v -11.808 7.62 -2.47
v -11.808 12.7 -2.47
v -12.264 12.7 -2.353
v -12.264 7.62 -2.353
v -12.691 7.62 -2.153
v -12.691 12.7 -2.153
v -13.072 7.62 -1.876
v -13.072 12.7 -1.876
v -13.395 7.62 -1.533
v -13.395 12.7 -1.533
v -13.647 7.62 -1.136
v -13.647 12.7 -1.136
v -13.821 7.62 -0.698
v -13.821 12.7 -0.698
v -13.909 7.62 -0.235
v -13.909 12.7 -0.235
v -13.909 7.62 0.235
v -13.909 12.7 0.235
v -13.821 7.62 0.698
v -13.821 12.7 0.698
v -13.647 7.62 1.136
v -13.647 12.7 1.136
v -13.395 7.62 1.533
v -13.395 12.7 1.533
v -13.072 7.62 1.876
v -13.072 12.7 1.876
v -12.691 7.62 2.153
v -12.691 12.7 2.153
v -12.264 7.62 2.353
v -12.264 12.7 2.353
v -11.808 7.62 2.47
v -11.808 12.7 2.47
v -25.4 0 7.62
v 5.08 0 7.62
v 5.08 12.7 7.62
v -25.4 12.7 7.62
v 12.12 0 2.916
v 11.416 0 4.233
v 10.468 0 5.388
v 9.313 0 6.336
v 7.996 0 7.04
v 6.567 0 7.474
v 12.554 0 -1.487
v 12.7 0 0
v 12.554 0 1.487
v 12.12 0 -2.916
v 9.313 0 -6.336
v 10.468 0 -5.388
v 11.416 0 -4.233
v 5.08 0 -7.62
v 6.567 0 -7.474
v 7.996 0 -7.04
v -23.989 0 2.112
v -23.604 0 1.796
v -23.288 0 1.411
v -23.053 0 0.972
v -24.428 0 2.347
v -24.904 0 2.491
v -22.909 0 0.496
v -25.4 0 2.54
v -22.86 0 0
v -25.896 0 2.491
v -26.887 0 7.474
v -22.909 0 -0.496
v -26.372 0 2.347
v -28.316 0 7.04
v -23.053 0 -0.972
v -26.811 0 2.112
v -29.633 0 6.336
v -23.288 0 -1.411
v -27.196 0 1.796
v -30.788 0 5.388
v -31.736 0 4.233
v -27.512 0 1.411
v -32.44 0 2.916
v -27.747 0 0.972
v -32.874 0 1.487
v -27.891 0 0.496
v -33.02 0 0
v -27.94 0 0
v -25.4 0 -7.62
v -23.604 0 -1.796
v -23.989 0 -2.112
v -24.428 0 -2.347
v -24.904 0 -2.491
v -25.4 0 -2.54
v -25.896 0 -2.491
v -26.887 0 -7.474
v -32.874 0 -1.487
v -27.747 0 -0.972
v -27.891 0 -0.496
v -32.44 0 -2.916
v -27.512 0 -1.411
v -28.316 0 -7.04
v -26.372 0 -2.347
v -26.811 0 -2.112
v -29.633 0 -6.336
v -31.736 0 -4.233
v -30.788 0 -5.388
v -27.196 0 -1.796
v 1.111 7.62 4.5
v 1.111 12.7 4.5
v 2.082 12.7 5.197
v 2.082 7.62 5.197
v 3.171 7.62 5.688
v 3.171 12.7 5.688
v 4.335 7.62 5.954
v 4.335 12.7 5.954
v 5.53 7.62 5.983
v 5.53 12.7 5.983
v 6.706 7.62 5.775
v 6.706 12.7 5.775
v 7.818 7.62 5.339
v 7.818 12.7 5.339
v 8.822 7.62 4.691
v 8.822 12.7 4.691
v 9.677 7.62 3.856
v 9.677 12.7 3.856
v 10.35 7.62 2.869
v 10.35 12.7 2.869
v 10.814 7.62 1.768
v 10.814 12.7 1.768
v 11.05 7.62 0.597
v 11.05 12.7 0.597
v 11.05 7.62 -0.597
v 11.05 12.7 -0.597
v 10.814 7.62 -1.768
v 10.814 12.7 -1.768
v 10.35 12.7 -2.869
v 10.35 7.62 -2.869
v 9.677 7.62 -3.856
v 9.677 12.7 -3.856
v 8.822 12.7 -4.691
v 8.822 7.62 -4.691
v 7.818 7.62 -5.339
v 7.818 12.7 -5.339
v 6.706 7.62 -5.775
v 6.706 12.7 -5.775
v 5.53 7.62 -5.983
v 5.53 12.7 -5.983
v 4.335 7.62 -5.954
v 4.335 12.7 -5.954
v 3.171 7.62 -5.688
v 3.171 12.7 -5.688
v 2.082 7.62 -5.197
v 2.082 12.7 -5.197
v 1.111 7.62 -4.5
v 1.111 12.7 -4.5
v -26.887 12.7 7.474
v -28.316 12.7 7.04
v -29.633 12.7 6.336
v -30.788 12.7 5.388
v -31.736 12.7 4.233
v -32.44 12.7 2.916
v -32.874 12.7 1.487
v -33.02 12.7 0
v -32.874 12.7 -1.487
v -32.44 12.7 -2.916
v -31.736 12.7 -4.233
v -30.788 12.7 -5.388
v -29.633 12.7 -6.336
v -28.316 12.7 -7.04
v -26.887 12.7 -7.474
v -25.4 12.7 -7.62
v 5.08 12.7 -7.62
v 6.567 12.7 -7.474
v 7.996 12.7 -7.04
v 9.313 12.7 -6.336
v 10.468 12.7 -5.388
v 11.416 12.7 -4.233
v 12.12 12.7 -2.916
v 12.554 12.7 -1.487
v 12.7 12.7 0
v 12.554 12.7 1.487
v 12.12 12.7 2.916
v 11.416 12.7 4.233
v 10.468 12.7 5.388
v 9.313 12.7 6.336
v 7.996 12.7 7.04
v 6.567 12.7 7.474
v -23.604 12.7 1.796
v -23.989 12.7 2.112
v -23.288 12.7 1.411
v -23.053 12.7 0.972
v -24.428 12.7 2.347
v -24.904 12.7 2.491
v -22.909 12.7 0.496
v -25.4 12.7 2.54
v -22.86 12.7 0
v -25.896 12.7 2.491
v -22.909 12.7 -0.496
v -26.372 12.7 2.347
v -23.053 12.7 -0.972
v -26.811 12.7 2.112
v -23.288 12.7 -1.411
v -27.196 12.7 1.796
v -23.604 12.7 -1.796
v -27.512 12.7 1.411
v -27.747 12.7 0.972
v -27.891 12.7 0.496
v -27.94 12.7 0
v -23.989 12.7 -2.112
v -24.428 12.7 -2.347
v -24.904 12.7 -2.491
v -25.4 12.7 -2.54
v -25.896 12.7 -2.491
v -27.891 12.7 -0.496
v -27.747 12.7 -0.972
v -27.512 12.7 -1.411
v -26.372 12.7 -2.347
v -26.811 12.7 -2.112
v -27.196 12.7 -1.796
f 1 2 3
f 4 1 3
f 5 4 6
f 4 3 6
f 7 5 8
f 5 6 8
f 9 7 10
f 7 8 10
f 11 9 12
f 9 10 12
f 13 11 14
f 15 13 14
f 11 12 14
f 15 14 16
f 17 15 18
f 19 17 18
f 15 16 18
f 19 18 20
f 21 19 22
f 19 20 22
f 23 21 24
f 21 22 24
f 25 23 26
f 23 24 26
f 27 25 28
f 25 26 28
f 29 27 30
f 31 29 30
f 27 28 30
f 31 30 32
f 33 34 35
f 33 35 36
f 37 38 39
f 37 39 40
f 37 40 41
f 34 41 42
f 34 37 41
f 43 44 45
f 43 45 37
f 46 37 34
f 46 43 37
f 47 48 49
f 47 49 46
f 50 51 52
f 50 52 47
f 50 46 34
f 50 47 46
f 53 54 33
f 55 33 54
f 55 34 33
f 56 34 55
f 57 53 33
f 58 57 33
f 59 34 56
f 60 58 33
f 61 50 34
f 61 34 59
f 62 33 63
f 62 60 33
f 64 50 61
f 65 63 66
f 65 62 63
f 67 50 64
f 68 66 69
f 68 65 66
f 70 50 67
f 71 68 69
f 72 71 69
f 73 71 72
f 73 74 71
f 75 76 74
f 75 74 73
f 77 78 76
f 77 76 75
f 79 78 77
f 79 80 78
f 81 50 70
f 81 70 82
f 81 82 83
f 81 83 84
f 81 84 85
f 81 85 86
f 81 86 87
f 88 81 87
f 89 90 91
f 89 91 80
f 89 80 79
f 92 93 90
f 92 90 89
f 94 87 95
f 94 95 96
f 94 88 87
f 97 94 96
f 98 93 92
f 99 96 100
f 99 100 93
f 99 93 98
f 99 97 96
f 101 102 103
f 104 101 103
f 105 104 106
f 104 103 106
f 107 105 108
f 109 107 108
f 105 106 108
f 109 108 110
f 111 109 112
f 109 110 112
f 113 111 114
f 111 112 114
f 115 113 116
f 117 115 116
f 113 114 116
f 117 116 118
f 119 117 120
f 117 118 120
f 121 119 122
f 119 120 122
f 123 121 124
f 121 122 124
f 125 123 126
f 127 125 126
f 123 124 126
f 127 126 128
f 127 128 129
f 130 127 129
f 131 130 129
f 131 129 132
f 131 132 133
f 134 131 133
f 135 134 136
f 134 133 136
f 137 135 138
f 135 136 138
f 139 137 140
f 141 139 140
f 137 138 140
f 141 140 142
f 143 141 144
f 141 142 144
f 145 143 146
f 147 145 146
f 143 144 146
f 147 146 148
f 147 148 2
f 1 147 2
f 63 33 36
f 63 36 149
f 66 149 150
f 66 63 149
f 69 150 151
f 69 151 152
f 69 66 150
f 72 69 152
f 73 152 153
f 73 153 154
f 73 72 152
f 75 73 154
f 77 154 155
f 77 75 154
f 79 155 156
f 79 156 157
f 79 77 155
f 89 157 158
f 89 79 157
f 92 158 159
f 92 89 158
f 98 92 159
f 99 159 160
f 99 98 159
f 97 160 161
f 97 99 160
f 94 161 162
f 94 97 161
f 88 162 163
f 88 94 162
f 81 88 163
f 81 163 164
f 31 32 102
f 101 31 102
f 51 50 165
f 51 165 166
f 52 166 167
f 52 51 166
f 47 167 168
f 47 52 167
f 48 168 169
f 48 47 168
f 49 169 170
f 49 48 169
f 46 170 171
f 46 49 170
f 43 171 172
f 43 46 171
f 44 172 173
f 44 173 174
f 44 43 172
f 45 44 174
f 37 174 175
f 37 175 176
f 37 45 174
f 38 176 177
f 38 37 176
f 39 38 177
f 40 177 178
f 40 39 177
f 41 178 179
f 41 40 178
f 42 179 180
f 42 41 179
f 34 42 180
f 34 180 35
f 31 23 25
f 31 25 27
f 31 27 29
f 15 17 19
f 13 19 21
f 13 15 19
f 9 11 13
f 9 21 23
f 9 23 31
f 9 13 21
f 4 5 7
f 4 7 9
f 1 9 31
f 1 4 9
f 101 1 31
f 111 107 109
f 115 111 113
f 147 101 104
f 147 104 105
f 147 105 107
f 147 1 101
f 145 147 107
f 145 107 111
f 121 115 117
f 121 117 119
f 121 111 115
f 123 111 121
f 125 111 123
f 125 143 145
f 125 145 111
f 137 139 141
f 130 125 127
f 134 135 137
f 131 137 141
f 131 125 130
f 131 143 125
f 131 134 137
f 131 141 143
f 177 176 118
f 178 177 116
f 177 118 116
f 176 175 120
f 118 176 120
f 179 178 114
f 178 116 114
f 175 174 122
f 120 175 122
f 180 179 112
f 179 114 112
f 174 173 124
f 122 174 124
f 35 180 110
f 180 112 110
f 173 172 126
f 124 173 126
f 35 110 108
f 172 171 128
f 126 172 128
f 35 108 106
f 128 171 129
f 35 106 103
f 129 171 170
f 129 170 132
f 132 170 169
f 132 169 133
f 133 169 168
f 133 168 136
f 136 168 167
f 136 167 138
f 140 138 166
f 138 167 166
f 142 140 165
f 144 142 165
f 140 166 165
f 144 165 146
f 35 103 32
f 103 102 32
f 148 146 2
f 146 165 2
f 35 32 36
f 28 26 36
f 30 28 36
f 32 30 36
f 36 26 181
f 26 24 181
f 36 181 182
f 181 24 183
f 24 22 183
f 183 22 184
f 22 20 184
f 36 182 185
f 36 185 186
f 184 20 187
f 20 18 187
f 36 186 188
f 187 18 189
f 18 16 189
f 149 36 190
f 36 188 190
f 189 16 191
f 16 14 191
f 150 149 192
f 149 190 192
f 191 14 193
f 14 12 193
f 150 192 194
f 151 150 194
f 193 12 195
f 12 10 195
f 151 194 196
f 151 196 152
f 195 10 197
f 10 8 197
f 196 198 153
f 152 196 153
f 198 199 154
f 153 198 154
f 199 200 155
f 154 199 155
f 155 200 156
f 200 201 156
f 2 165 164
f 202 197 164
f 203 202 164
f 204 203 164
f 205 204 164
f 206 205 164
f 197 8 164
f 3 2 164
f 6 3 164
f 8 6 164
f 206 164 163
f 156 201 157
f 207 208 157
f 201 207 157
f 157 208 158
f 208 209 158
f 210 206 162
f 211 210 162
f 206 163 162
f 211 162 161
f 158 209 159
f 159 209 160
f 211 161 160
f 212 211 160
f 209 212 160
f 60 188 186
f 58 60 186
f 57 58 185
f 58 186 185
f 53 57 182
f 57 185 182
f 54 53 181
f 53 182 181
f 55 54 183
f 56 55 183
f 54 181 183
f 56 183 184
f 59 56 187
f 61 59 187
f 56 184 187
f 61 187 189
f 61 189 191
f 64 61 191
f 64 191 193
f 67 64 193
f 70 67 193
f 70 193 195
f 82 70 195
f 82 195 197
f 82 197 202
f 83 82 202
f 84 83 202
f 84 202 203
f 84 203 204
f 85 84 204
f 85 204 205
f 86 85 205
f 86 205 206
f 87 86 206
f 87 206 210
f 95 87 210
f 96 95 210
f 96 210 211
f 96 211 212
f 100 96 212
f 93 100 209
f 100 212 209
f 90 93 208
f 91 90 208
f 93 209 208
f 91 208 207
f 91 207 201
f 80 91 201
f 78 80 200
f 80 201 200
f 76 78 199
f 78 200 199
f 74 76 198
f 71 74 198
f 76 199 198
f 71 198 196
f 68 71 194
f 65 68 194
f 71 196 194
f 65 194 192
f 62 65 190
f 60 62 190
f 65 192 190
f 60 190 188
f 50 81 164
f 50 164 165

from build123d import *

# Parameters (mm, degrees)
BOSS_EXTRUDE1_DEPTH = 12.7
SKETCH4_R           = 2.54
CUT_EXTRUDE3_DEPTH  = 37.189429396
CUT_EXTRUDE4_DEPTH  = 5.08


with BuildPart() as part:
    # Sketch3 → Boss-Extrude1 (new body)
    with BuildSketch(Plane(origin=(0, 0, 0), x_dir=(1, 0, 0), z_dir=(0, 1, 0))):
        with BuildLine():
            Line((-25.4, 7.62), (5.08, 7.62))
            ThreePointArc((5.08, 7.62), (12.7, 0), (5.08, -7.62))
            Line((5.08, -7.62), (-25.4, -7.62))
            ThreePointArc((-25.4, -7.62), (-33.02, 0), (-25.4, 7.62))
        make_face()
    extrude(amount=BOSS_EXTRUDE1_DEPTH)

    # Sketch4 → Cut-Extrude3 (cut, through all)
    with BuildSketch(Plane(origin=(0, 12.7, 0), x_dir=(1, 0, 0), z_dir=(0, 1, 0))):
        with Locations(Location((-25.4, 0, 0), (0, 0, 270))):
            Circle(SKETCH4_R)
    extrude(amount=-CUT_EXTRUDE3_DEPTH, mode=Mode.SUBTRACT)

    # Sketch5 → Cut-Extrude4 (cut)
    with BuildSketch(Plane(origin=(0, 12.7, 0), x_dir=(1, 0, 0), z_dir=(0, 1, 0))):
        with BuildLine():
            Line((-11.808123317, -2.469691065), (1.11137089, -4.50000243))
            ThreePointArc((1.11137089, -4.50000243), (11.08000324, 0), (1.11137089, 4.50000243))
            Line((1.11137089, 4.50000243), (-11.808123317, 2.469691065))
            ThreePointArc((-11.808123317, 2.469691065), (-13.92001026, 0), (-11.808123317, -2.469691065))
        make_face()
    extrude(amount=-CUT_EXTRUDE4_DEPTH, mode=Mode.SUBTRACT)


solid = part.part
